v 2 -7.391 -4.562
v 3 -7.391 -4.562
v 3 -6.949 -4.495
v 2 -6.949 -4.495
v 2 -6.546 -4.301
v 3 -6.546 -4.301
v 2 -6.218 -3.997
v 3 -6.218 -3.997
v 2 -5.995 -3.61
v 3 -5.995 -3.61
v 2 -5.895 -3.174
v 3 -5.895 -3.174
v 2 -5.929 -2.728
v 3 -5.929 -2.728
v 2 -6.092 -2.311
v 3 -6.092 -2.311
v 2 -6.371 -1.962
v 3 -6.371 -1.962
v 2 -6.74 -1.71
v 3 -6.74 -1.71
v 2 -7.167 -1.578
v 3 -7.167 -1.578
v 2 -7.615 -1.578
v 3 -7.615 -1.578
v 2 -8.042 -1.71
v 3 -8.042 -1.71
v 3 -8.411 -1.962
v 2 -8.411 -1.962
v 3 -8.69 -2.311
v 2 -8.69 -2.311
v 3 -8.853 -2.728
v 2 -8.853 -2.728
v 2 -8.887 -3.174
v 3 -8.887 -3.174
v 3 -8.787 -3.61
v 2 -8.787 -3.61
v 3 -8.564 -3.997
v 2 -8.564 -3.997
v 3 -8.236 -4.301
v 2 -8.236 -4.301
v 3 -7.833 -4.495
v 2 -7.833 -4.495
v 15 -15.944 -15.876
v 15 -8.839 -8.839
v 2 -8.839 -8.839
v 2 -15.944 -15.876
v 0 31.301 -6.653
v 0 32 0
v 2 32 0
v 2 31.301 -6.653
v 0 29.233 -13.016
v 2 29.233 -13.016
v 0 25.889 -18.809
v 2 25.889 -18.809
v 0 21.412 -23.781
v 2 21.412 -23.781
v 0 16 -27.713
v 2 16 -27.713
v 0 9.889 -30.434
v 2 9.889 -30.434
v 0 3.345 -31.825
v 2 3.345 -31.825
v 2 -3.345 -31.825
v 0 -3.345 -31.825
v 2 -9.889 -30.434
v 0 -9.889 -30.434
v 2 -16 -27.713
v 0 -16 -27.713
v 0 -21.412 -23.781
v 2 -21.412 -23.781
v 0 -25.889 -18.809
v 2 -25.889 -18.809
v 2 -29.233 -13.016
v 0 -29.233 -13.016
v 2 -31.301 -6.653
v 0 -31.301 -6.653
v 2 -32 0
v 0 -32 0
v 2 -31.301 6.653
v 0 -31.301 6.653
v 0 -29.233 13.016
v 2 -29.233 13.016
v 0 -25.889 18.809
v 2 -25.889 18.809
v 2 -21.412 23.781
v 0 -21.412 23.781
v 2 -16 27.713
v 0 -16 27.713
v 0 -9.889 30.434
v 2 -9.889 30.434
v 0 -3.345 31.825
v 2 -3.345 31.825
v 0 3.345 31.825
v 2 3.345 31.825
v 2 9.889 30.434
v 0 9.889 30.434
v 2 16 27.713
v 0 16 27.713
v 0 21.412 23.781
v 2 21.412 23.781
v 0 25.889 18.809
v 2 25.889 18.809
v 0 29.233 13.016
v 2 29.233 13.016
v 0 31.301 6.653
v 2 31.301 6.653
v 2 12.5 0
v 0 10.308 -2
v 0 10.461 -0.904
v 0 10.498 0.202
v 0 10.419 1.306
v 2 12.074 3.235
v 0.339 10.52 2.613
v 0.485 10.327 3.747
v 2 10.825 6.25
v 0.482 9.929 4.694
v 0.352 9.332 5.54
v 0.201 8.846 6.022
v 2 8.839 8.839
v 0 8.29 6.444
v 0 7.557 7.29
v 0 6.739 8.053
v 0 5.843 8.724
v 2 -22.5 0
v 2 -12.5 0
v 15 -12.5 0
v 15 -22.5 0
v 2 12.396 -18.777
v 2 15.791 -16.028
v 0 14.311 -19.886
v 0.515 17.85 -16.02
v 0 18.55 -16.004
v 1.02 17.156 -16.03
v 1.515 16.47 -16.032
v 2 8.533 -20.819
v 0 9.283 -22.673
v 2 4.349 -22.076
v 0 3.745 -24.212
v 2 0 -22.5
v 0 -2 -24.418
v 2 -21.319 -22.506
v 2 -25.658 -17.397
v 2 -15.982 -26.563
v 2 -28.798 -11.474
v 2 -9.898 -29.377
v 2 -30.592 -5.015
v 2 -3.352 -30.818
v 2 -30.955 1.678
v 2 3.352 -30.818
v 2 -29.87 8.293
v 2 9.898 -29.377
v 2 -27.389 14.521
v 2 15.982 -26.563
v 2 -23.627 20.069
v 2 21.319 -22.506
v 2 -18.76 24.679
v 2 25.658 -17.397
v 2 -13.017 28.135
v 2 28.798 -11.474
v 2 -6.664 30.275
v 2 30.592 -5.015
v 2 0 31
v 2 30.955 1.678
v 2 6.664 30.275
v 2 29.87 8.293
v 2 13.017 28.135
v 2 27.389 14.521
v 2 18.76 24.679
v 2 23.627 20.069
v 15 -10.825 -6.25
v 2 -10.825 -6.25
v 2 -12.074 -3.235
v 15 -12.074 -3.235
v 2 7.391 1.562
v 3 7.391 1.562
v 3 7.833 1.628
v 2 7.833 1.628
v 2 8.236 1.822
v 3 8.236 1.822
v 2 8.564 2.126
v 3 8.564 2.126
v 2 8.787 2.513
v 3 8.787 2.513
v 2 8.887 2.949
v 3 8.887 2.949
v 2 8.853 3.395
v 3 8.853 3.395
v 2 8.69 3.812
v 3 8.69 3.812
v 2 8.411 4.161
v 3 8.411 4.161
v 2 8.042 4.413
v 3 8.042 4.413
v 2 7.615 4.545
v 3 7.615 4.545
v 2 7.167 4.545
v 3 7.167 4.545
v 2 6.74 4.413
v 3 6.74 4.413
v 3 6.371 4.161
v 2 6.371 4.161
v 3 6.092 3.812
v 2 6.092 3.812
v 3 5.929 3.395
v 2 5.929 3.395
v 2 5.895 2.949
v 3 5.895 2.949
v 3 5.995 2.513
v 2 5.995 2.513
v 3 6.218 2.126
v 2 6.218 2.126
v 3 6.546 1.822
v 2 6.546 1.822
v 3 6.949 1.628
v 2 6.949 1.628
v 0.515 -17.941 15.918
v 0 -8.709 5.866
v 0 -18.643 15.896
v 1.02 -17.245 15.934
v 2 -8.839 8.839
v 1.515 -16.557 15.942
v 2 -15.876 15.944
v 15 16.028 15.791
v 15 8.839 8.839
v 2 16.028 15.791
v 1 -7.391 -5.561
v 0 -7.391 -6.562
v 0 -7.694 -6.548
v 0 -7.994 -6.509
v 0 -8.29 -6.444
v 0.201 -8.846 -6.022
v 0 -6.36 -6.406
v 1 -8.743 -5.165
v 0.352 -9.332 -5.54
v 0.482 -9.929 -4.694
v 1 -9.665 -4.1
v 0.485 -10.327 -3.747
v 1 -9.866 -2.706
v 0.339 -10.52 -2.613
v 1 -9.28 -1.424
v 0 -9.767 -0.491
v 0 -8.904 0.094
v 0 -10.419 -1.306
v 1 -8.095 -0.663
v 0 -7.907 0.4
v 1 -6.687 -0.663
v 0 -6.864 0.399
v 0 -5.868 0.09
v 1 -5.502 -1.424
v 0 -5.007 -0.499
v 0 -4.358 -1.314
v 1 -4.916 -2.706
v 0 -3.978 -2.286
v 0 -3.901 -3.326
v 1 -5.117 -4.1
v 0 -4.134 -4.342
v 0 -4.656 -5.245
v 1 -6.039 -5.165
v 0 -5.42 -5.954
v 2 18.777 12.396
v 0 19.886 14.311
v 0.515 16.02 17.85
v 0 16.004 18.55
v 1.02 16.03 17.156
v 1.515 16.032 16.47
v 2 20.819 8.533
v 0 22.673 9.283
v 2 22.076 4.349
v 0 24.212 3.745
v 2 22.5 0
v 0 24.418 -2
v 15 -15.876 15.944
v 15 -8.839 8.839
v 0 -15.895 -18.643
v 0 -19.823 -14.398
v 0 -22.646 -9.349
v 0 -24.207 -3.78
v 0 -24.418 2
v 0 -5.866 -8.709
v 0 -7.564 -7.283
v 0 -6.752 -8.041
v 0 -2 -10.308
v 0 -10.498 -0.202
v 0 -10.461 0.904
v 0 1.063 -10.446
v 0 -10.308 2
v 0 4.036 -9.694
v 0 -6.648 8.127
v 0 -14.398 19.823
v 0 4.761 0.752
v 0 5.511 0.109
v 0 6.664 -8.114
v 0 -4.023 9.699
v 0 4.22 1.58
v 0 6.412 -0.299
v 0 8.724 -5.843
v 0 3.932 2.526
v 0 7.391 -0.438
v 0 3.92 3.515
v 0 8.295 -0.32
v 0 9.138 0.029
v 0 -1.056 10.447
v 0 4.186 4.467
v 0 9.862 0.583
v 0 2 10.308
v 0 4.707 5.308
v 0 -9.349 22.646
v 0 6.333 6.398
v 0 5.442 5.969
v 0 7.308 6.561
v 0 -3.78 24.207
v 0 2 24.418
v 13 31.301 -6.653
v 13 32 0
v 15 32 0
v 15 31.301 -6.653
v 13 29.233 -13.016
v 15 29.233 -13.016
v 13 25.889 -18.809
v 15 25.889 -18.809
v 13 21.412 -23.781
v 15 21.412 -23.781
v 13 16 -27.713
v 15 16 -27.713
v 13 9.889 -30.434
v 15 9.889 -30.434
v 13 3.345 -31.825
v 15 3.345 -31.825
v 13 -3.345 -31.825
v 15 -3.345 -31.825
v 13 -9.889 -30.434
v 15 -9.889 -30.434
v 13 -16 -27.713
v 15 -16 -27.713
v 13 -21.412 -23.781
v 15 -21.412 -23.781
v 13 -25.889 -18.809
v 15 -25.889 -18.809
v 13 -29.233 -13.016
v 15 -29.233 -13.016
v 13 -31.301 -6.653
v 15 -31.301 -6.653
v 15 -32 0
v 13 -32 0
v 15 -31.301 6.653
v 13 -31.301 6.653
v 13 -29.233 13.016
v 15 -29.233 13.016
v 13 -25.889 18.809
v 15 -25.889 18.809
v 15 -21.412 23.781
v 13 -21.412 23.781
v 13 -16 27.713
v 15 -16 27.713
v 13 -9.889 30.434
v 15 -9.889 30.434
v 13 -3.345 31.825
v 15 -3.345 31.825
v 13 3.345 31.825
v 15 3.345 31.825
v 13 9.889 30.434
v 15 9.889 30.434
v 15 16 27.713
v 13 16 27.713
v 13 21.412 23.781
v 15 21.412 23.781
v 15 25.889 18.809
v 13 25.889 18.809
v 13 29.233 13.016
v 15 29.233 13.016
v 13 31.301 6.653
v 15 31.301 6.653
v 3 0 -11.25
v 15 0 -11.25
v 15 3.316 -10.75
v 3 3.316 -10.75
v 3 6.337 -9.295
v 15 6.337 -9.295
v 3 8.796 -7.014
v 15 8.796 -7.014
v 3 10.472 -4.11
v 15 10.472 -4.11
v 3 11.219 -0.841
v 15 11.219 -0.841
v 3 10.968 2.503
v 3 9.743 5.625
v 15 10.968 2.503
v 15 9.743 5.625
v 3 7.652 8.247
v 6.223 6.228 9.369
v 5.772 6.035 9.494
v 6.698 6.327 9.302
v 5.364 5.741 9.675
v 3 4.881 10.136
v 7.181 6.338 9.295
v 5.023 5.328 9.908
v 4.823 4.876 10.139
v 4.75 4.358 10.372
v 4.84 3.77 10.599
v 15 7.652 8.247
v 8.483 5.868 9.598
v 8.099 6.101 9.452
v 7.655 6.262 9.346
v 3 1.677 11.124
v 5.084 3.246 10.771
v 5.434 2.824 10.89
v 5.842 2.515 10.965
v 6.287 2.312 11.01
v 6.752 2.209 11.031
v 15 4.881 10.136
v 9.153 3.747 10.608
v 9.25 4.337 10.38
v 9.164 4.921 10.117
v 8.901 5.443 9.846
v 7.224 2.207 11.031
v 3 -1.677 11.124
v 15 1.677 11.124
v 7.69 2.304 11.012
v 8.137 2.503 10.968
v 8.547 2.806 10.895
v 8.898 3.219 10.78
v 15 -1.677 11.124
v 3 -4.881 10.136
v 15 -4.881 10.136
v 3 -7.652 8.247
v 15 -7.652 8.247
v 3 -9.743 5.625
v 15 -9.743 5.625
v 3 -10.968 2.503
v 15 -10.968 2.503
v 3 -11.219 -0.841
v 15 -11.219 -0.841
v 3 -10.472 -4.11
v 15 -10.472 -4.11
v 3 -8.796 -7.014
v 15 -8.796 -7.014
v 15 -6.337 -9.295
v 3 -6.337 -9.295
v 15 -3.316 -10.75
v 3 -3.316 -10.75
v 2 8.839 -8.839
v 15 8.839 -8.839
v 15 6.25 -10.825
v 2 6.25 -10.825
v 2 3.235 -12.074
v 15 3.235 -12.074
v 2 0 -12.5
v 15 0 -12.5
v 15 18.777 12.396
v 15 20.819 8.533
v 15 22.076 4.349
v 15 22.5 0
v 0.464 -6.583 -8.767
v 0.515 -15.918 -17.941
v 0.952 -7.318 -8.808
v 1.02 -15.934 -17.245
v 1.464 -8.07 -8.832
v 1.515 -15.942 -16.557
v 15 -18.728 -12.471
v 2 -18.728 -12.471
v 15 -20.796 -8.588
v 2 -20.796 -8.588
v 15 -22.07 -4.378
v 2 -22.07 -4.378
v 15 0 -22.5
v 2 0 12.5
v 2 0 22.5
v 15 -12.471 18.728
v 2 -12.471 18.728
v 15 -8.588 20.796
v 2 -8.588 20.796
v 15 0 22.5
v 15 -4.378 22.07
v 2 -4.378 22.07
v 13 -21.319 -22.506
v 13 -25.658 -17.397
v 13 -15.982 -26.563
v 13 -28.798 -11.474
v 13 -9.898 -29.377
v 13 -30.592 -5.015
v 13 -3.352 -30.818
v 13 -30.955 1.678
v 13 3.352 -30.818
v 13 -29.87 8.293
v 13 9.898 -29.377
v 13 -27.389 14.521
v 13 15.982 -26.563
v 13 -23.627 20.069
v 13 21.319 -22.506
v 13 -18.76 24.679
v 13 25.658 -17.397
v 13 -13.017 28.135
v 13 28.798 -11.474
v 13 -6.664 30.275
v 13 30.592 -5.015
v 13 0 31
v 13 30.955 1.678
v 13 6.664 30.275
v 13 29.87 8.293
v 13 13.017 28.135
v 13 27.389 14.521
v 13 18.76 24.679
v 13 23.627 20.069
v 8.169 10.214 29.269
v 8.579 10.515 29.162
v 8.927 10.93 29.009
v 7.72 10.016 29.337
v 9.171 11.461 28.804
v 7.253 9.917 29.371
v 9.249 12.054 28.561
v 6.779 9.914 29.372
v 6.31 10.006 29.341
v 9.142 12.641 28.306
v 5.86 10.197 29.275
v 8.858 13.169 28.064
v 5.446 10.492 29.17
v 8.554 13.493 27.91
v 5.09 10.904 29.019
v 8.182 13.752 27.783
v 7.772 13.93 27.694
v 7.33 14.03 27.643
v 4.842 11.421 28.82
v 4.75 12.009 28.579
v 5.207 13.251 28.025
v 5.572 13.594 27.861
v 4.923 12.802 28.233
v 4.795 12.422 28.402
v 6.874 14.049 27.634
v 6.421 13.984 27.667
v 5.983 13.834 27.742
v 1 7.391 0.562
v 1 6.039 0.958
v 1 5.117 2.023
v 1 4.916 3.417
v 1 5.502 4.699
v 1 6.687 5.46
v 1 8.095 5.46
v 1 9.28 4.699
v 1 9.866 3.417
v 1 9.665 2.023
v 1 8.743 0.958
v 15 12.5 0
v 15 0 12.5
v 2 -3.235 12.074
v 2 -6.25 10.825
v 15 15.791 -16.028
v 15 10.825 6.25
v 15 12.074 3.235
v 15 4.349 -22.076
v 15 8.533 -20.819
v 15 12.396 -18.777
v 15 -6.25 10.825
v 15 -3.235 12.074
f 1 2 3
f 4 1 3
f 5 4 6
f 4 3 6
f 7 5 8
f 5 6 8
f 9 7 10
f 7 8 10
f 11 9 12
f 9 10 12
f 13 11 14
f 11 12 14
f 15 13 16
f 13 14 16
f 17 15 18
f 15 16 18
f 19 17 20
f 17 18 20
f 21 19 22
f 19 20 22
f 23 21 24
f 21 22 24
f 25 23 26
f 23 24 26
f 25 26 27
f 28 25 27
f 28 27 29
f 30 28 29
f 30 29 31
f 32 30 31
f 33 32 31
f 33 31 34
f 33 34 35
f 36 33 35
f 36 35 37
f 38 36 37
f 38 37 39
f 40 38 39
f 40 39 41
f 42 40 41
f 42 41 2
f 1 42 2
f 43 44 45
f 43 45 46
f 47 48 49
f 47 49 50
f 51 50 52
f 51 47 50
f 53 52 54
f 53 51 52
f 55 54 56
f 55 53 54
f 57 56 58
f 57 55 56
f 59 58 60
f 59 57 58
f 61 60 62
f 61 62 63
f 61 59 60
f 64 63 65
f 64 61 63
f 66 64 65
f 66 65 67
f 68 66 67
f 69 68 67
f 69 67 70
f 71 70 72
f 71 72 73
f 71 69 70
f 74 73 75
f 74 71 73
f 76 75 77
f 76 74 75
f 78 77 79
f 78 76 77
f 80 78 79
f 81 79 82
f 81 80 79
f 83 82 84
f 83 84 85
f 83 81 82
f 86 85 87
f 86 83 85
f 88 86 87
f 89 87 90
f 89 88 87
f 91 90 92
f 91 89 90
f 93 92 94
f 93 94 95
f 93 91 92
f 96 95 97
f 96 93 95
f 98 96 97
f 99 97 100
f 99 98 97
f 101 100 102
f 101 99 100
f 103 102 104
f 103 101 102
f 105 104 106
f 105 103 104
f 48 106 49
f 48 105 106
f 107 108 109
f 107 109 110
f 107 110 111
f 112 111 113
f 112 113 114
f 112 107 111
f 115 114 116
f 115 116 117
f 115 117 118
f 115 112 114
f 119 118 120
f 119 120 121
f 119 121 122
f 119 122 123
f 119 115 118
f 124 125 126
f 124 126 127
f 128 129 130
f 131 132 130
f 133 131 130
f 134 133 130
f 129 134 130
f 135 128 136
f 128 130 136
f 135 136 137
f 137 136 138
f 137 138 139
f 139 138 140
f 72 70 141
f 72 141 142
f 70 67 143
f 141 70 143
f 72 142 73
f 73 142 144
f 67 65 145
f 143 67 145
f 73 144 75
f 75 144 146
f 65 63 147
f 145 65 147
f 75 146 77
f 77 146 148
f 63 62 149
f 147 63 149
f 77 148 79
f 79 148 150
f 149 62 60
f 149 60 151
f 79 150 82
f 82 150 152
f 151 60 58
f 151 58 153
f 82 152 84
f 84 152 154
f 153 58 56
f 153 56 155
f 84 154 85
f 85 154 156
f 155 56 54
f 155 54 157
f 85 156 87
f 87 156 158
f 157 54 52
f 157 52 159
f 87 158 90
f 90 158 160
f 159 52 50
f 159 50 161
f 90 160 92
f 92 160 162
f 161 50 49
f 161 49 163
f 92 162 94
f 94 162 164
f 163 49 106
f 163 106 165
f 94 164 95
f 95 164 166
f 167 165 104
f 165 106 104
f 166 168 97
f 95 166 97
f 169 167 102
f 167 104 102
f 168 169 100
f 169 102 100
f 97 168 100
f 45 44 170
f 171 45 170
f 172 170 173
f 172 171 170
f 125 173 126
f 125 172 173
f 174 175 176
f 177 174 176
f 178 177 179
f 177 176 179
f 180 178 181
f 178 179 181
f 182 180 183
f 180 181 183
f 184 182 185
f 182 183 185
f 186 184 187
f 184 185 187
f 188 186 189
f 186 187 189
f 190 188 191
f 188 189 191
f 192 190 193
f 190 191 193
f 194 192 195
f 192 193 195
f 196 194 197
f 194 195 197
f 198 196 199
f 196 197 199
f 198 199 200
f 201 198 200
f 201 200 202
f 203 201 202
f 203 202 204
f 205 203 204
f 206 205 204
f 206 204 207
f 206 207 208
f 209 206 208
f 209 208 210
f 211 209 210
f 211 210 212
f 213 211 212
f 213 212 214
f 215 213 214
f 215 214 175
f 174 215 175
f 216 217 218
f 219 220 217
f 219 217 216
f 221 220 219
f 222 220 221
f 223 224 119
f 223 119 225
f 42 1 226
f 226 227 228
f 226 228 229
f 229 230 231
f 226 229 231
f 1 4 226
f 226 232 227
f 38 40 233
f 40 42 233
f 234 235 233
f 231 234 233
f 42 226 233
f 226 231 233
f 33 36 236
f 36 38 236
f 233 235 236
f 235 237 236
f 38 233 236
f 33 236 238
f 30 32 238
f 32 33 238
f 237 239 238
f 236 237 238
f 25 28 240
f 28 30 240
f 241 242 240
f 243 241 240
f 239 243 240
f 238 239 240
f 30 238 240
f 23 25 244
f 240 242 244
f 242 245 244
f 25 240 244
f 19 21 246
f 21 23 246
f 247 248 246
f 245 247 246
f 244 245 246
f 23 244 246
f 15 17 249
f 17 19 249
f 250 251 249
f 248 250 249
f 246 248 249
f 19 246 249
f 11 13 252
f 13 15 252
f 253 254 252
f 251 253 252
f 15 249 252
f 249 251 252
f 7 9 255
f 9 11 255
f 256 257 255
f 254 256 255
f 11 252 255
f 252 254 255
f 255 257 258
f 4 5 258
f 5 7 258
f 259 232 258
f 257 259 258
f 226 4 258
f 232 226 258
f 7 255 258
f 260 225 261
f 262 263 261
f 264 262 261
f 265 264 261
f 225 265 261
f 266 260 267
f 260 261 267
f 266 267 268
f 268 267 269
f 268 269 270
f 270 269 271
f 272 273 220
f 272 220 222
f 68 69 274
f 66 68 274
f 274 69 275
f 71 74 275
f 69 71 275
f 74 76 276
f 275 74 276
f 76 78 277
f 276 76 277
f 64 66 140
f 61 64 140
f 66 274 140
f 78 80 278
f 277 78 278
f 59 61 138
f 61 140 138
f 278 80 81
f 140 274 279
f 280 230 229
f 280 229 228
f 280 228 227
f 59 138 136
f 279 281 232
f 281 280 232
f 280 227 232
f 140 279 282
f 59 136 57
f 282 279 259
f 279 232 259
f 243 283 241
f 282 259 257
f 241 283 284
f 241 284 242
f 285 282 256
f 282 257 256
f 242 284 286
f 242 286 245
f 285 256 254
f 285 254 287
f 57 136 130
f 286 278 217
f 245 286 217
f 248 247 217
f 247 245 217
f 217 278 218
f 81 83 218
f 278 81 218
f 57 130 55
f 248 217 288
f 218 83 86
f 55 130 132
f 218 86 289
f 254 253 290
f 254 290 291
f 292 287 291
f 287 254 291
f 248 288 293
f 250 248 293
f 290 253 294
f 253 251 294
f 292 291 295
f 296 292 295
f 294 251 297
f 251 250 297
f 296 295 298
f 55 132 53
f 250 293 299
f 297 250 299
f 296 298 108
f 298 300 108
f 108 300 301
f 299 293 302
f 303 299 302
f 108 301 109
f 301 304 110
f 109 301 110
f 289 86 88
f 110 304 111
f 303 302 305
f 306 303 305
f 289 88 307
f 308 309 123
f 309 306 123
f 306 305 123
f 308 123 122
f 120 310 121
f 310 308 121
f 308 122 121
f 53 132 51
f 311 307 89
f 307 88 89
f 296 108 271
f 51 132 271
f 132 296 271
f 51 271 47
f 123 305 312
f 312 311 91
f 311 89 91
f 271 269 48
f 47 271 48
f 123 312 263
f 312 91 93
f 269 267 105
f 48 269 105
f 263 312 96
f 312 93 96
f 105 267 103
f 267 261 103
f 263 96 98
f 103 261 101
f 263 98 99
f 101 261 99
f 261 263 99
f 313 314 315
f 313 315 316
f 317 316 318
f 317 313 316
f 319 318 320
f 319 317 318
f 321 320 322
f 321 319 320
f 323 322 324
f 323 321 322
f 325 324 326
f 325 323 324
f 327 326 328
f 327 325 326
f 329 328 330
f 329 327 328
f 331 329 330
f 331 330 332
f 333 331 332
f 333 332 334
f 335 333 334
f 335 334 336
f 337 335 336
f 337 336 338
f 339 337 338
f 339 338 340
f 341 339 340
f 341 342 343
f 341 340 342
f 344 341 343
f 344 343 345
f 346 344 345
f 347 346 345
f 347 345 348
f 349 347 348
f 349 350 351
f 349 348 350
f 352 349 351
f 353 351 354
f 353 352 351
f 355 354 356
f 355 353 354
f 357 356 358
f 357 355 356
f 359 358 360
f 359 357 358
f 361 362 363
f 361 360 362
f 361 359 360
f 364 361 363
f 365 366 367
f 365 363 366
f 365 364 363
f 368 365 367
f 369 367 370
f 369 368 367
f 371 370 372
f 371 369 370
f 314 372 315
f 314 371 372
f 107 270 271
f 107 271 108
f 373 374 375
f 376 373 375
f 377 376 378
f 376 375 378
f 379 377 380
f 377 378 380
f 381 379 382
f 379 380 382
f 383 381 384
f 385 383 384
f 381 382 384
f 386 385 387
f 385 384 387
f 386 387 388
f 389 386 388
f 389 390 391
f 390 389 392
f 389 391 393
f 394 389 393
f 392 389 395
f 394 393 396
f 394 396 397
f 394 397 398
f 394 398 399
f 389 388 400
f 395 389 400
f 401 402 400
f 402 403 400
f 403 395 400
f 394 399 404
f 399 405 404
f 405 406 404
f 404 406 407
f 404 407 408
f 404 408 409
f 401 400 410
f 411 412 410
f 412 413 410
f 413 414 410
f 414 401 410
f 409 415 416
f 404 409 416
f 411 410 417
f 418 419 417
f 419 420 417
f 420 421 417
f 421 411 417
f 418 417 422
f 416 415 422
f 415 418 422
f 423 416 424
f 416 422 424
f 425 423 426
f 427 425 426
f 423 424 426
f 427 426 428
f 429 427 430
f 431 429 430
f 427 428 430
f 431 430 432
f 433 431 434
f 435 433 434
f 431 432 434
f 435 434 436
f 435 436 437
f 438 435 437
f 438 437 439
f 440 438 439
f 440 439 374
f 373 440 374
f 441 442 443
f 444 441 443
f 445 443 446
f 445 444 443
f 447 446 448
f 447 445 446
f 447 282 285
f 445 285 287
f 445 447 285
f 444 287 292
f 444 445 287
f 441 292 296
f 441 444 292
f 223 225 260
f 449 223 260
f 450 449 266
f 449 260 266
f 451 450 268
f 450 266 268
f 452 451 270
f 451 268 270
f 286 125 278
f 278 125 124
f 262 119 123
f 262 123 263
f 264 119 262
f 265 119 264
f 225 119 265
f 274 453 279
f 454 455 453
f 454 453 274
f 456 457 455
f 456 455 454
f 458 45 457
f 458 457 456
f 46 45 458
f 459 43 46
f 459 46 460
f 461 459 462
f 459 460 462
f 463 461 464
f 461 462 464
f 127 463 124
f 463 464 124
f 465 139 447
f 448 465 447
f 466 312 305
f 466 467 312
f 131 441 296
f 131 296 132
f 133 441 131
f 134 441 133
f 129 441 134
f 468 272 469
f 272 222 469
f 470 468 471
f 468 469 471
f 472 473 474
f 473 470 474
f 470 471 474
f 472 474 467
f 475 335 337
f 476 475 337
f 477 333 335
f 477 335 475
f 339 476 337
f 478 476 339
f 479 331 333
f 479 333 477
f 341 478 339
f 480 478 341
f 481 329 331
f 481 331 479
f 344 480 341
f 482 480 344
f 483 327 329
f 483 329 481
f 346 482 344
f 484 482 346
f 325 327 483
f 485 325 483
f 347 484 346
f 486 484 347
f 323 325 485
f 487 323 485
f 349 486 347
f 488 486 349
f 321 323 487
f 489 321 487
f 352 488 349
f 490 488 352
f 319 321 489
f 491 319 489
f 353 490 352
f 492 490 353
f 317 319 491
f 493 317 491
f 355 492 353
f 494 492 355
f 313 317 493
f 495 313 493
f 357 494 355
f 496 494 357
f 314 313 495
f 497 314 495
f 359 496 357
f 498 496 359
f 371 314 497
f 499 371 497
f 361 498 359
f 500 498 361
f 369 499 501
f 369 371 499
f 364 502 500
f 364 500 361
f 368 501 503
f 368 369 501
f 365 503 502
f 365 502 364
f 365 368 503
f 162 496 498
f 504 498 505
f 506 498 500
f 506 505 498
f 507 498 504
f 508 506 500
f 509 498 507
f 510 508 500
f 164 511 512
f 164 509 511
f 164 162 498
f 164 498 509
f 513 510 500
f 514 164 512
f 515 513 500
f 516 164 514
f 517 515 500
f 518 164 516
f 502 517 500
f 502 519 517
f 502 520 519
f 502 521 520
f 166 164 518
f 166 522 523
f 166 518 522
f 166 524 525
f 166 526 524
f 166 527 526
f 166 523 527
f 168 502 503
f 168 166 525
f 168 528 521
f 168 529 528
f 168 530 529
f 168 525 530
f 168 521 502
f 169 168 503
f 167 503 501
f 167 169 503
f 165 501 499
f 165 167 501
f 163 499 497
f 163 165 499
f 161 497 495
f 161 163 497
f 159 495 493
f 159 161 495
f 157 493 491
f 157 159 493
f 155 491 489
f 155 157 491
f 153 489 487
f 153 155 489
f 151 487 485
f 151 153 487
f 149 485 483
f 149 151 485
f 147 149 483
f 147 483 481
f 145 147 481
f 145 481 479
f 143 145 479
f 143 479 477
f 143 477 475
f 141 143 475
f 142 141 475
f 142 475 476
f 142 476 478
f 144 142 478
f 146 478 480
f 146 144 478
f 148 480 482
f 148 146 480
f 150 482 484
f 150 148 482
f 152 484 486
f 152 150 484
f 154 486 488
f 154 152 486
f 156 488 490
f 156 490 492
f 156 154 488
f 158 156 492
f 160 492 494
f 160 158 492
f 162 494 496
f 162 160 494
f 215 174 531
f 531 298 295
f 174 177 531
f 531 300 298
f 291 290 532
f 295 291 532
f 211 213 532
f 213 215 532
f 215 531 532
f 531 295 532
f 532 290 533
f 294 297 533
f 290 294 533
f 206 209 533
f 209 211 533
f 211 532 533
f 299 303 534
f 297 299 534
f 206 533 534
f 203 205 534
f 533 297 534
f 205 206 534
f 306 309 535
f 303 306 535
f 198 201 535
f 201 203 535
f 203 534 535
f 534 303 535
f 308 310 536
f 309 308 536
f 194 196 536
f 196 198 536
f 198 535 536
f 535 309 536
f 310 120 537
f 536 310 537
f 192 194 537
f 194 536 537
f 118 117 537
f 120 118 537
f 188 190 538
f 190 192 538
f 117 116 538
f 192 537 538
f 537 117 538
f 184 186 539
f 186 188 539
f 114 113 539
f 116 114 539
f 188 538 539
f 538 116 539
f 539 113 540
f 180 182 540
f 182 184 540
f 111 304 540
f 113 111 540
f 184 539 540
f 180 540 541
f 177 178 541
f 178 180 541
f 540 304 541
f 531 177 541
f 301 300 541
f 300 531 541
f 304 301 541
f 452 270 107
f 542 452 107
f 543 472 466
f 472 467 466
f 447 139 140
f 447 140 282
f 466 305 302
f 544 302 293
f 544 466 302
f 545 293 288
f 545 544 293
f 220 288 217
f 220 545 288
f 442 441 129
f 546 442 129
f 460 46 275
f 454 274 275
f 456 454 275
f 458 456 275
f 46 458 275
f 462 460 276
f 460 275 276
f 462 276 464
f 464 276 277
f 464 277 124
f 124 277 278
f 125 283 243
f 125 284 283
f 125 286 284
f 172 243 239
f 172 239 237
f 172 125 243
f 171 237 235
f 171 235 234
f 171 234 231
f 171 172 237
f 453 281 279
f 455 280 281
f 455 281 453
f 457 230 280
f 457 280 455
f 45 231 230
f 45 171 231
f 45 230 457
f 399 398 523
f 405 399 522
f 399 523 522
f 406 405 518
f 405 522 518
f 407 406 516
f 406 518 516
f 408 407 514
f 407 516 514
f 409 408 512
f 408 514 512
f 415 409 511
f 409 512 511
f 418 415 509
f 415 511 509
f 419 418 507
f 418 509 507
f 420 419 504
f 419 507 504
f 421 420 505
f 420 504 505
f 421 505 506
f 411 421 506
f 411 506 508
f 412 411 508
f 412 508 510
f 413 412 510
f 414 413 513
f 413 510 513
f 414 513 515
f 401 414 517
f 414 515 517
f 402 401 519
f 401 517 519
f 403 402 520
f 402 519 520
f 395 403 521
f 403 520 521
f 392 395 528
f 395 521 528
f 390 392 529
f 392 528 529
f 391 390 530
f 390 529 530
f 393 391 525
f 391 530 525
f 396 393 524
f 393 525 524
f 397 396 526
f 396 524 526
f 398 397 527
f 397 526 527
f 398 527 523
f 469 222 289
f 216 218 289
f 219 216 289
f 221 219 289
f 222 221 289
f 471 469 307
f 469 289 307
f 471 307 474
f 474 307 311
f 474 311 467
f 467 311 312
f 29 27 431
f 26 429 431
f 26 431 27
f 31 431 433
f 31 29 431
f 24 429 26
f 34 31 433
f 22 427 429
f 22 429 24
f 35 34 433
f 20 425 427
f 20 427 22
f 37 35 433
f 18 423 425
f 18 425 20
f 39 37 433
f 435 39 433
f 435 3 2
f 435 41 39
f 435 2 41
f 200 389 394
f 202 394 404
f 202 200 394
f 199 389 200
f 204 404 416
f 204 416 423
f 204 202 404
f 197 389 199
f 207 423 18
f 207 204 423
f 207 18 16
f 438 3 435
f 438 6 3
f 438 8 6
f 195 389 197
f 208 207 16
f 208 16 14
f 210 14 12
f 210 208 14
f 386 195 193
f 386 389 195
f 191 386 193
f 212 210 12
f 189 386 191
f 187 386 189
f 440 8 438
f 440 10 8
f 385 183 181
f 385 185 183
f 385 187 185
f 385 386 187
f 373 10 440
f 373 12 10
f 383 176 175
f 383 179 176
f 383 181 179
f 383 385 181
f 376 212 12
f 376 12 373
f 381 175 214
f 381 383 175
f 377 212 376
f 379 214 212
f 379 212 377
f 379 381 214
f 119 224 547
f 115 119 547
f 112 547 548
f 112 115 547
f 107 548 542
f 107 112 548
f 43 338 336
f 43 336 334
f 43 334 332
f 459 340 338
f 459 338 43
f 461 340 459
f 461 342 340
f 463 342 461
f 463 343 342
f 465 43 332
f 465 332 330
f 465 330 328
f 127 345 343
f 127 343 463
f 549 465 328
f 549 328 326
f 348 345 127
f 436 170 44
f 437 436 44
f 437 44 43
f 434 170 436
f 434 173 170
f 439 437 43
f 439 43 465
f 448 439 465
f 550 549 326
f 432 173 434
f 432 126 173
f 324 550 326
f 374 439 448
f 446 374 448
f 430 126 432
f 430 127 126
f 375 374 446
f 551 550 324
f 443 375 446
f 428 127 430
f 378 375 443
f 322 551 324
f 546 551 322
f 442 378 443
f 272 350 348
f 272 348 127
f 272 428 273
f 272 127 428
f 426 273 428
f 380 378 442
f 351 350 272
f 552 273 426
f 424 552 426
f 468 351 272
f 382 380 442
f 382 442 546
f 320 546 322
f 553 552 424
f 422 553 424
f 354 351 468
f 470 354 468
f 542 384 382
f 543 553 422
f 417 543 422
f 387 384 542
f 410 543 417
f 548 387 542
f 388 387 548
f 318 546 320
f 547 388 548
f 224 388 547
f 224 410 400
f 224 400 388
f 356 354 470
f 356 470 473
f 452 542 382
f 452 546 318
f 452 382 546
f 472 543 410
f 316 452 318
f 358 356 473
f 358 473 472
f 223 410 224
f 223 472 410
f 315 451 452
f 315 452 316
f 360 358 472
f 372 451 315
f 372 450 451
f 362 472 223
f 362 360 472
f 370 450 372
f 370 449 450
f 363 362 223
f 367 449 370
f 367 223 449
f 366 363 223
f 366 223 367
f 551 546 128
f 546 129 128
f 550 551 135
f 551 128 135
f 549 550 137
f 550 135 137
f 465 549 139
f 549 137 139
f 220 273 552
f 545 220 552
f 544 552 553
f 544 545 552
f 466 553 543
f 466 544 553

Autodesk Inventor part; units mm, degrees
ref_plane "XZ Plane" through (0, 0, 0) normal (0, 1, 0) x (-1, 0, 0)
ref_plane "XY Plane" through (0, 0, 0) normal (0, 0, 1) x (1, 0, 0)
sketch "Эскиз1" plane through (0, 0, 0) normal (1, 0, 0) x (0, 1, 0)
  circle A0 centre (0, 0) radius 33
  circle A1 centre (0, 0) radius 27.5
  line L0 (27.5, 0) -> (12.5, 0)
  line L1 (0, 27.5) -> (0, 12.5)
  arc A2 (0, -12.5) -> (12.5, 0) centre (0, 0) ccw
  arc A3 (-12.5, 0) -> (0, -12.5) centre (0, 0) ccw
  arc A4 (0, 12.5) -> (-12.5, 0) centre (0, 0) ccw
  arc A5 (12.5, 0) -> (0, 12.5) centre (0, 0) ccw
  line L2 (27.5, 0) -> (22.5, 0)
  line L3 (0, -27.5) -> (0, -22.5)
  line L4 (27.5, 0) -> (22.5, 0)
  line L5 (0, 27.5) -> (0, 22.5)
  line L6 (-27.5, 0) -> (-22.5, 0)
  circle A6 centre (0, 0) radius 22.5
  line L7 (-8.8388, -8.8388) -> (-15.9436, -15.8761)
  line L8 (-12.5, 0) -> (-22.5, 0)
  line L9 (-8.8388, 8.8388) -> (-15.8761, 15.9436)
  line L10 (8.8388, 8.8388) -> (16.0277, 15.7912)
  line L11 (12.5, 0) -> (22.5, 0)
  line L12 (0, 12.5) -> (0, 22.5)
  line L13 (8.8388, -8.8388) -> (15.7912, -16.0277)
  line L14 (0, -22.5) -> (0, -12.5)
  circle A7 centre (0, 0) radius 27.5
  circle A8 centre (0, 0) radius 32
  point P0 (-27.5, 0)
  point P1 (0, 22.5)
  point P2 (0, 22.5)
  point P3 (-22.5, 0)
  point P4 (-22.5, 0)
  dimension "d2" = 15
  dimension "d3" = 15
  dimension "d4" = 15
  dimension "d5" = 15
  dimension "d21" = 5
  dimension "d22" = 5
  dimension "d25" = 360
  dimension "d67" = 64
extrude "Выдавливание1" add sketch "Эскиз1" along normal blind 15 contours L0 A6 L1 A1 | A1 L3 A6 L0 | L1 A6 L6 A1 | A1 L6 A6 L3 | A6 L13 A2 L0 | L0 A5 L10 A6 | A6 L10 A5 L1 | L1 A4 L9 A6 | L14 A2 L13 A6 | A6 L7 A3 L14 | A2 A3 A4 A5 | L8 A3 L7 A6 | A6 L9 A4 L8 | A8
sketch "Эскиз5" plane through (15, 0, 0) normal (1, 0, 0) x (0, 0, -1)
  point P0 (0, 0)
extrude "Выдавливание3" cut sketch "Эскиз1" along normal blind 15 contours L0 A5 L10 A6 | L1 A4 L9 A6 | L14 A2 L13 A6 | L8 A3 L7 A6
sketch "Эскиз6" plane through (15, 0, 0) normal (1, 0, 0) x (0, 0, -1)
  circle A0 centre (0, 0) radius 11.25
  arc A1 (0, 12.5) -> (-8.8388, 8.8388) centre (0, 0) ccw projected
  arc A2 (0, 12.5) -> (-8.8388, 8.8388) centre (0, 0) ccw
  line L0 (0, 0) -> (-3.0615, 7.391) construction
  circle A3 centre (-3.0615, 7.391) radius 1.5
  circle A4 centre (-7.391, -3.0615) radius 1.5
  circle A5 centre (3.0615, -7.391) radius 1.5
  circle A6 centre (7.391, 3.0615) radius 1.5
  arc A7 (-3.0615, 7.391) -> (-7.391, -3.0615) centre (0, 0) ccw
  line L1 (-8.8388, 8.8388) -> (-22.3952, 22.8573) construction
  circle A8 centre (0, 0) radius 32 construction
  line L2 (-8.8388, 8.8388) -> (10.6622, 8.8388) construction
  arc A9 (-22.3952, 22.8573) -> (-32, 0) centre (0, 0) ccw construction
  line L3 (-29.5012, 12.3966) -> (-7.391, 3.0615)
  dimension "d31" = 22.5
  dimension "d72" = 8
  dimension "d74" = 3
  dimension "d77" = 360
  dimension "d79" = 134.04
extrude "Выдавливание4" [suppressed]
extrude "Выдавливание5" cut sketch "Эскиз6" against normal blind 12 contours A0 | A3 | A4 | A5 | A6
extrude "Выдавливание6" [suppressed]
chamfer "Фаска2" distance 2 angle 45 1 edges at (0, -12.3912, -12.3575)
chamfer "Фаска3" distance 2 angle 45 15 edges at (0, -20.7964, -8.5883) (0, -17.5, 0) (0, -11.5485, -4.7835) (0, 0, -17.5) (0, 8.5331, -20.8191) (0, 12.315, -12.4333) (0, 4.7835, -11.5485) (0, 17.5, 0) (0, 11.5485, 4.7835) (0, 20.8191, 8.5331) (0, 12.4333, 12.315) (0, 0, 17.5) (0, -4.7835, 11.5485) (0, -12.3575, 12.3912) (0, -8.5883, 20.7964)
ref_plane "РабПлоскость3" through (2, 0, 0) normal (1, 0, 0) x (0, 1, 0)
sketch "Эскиз10" plane through (2, 0, 0) normal (1, 0, 0) x (0, 1, 0)
  circle A0 centre (0, 0) radius 26.5
  circle A1 centre (0, 0) radius 27.5 projected
  circle A2 centre (0, 0) radius 26.5
  dimension "d66" = 53
sketch "Эскиз11" plane through (0, 0, 0) normal (-1, 0, 0) x (0, 0, 1)
  circle A0 centre (0, 0) radius 31
  circle A1 centre (0, 0) radius 32
  dimension "d68" = 62
extrude "Выдавливание9" cut sketch "Эскиз11" against normal blind 11 from surface at -2
extrude "Выдавливание10" cut sketch "Эскиз6" against normal blind 15 contours A3 | A5
chamfer "Фаска4" distance 2 angle 45 2 edges at (0, 7.391, 4.5615) (0, -7.391, -1.5615)
sketch "Эскиз12" plane through (15, 0, 0) normal (1, 0, 0) x (0, 0, -1)
  circle A0 centre (0, 0) radius 32 projected
  arc A1 (0, 12.5) -> (-8.8388, 8.8388) centre (0, 0) ccw projected
  line L0 (-8.8388, 8.8388) -> (-22.3952, 22.8573)
  circle A2 centre (0, 0) radius 32 projected
  line L1 (-8.8388, 8.8388) -> (10.6622, 8.8388) construction
  point P0 (0, 0)
  point P1 (-32, 0)
  dimension "d85" = 134.04
ref_plane "РабПлоскость4" through (15, 12.3966, 29.5012) normal (0, 0.387395, 0.9219138) x (-1, 0, 0)
sketch "Эскиз14" plane through (15, 12.3966, 29.5012) normal (0, 0.387395, 0.9219138) x (-1, 0, 0)
  circle A0 centre (8, 0) radius 2.25
  point P0 (15, 0)
  dimension "d87" = 4.5
extrude "Выдавливание11" cut sketch "Эскиз14" against normal blind 25
sketch "Эскиз15" plane through (3, 0, 0) normal (1, 0, 0) x (0, 0, -1)
  circle A0 centre (0, 0) radius 2
  dimension "d90" = 4
properties part number "колеса прототип"
